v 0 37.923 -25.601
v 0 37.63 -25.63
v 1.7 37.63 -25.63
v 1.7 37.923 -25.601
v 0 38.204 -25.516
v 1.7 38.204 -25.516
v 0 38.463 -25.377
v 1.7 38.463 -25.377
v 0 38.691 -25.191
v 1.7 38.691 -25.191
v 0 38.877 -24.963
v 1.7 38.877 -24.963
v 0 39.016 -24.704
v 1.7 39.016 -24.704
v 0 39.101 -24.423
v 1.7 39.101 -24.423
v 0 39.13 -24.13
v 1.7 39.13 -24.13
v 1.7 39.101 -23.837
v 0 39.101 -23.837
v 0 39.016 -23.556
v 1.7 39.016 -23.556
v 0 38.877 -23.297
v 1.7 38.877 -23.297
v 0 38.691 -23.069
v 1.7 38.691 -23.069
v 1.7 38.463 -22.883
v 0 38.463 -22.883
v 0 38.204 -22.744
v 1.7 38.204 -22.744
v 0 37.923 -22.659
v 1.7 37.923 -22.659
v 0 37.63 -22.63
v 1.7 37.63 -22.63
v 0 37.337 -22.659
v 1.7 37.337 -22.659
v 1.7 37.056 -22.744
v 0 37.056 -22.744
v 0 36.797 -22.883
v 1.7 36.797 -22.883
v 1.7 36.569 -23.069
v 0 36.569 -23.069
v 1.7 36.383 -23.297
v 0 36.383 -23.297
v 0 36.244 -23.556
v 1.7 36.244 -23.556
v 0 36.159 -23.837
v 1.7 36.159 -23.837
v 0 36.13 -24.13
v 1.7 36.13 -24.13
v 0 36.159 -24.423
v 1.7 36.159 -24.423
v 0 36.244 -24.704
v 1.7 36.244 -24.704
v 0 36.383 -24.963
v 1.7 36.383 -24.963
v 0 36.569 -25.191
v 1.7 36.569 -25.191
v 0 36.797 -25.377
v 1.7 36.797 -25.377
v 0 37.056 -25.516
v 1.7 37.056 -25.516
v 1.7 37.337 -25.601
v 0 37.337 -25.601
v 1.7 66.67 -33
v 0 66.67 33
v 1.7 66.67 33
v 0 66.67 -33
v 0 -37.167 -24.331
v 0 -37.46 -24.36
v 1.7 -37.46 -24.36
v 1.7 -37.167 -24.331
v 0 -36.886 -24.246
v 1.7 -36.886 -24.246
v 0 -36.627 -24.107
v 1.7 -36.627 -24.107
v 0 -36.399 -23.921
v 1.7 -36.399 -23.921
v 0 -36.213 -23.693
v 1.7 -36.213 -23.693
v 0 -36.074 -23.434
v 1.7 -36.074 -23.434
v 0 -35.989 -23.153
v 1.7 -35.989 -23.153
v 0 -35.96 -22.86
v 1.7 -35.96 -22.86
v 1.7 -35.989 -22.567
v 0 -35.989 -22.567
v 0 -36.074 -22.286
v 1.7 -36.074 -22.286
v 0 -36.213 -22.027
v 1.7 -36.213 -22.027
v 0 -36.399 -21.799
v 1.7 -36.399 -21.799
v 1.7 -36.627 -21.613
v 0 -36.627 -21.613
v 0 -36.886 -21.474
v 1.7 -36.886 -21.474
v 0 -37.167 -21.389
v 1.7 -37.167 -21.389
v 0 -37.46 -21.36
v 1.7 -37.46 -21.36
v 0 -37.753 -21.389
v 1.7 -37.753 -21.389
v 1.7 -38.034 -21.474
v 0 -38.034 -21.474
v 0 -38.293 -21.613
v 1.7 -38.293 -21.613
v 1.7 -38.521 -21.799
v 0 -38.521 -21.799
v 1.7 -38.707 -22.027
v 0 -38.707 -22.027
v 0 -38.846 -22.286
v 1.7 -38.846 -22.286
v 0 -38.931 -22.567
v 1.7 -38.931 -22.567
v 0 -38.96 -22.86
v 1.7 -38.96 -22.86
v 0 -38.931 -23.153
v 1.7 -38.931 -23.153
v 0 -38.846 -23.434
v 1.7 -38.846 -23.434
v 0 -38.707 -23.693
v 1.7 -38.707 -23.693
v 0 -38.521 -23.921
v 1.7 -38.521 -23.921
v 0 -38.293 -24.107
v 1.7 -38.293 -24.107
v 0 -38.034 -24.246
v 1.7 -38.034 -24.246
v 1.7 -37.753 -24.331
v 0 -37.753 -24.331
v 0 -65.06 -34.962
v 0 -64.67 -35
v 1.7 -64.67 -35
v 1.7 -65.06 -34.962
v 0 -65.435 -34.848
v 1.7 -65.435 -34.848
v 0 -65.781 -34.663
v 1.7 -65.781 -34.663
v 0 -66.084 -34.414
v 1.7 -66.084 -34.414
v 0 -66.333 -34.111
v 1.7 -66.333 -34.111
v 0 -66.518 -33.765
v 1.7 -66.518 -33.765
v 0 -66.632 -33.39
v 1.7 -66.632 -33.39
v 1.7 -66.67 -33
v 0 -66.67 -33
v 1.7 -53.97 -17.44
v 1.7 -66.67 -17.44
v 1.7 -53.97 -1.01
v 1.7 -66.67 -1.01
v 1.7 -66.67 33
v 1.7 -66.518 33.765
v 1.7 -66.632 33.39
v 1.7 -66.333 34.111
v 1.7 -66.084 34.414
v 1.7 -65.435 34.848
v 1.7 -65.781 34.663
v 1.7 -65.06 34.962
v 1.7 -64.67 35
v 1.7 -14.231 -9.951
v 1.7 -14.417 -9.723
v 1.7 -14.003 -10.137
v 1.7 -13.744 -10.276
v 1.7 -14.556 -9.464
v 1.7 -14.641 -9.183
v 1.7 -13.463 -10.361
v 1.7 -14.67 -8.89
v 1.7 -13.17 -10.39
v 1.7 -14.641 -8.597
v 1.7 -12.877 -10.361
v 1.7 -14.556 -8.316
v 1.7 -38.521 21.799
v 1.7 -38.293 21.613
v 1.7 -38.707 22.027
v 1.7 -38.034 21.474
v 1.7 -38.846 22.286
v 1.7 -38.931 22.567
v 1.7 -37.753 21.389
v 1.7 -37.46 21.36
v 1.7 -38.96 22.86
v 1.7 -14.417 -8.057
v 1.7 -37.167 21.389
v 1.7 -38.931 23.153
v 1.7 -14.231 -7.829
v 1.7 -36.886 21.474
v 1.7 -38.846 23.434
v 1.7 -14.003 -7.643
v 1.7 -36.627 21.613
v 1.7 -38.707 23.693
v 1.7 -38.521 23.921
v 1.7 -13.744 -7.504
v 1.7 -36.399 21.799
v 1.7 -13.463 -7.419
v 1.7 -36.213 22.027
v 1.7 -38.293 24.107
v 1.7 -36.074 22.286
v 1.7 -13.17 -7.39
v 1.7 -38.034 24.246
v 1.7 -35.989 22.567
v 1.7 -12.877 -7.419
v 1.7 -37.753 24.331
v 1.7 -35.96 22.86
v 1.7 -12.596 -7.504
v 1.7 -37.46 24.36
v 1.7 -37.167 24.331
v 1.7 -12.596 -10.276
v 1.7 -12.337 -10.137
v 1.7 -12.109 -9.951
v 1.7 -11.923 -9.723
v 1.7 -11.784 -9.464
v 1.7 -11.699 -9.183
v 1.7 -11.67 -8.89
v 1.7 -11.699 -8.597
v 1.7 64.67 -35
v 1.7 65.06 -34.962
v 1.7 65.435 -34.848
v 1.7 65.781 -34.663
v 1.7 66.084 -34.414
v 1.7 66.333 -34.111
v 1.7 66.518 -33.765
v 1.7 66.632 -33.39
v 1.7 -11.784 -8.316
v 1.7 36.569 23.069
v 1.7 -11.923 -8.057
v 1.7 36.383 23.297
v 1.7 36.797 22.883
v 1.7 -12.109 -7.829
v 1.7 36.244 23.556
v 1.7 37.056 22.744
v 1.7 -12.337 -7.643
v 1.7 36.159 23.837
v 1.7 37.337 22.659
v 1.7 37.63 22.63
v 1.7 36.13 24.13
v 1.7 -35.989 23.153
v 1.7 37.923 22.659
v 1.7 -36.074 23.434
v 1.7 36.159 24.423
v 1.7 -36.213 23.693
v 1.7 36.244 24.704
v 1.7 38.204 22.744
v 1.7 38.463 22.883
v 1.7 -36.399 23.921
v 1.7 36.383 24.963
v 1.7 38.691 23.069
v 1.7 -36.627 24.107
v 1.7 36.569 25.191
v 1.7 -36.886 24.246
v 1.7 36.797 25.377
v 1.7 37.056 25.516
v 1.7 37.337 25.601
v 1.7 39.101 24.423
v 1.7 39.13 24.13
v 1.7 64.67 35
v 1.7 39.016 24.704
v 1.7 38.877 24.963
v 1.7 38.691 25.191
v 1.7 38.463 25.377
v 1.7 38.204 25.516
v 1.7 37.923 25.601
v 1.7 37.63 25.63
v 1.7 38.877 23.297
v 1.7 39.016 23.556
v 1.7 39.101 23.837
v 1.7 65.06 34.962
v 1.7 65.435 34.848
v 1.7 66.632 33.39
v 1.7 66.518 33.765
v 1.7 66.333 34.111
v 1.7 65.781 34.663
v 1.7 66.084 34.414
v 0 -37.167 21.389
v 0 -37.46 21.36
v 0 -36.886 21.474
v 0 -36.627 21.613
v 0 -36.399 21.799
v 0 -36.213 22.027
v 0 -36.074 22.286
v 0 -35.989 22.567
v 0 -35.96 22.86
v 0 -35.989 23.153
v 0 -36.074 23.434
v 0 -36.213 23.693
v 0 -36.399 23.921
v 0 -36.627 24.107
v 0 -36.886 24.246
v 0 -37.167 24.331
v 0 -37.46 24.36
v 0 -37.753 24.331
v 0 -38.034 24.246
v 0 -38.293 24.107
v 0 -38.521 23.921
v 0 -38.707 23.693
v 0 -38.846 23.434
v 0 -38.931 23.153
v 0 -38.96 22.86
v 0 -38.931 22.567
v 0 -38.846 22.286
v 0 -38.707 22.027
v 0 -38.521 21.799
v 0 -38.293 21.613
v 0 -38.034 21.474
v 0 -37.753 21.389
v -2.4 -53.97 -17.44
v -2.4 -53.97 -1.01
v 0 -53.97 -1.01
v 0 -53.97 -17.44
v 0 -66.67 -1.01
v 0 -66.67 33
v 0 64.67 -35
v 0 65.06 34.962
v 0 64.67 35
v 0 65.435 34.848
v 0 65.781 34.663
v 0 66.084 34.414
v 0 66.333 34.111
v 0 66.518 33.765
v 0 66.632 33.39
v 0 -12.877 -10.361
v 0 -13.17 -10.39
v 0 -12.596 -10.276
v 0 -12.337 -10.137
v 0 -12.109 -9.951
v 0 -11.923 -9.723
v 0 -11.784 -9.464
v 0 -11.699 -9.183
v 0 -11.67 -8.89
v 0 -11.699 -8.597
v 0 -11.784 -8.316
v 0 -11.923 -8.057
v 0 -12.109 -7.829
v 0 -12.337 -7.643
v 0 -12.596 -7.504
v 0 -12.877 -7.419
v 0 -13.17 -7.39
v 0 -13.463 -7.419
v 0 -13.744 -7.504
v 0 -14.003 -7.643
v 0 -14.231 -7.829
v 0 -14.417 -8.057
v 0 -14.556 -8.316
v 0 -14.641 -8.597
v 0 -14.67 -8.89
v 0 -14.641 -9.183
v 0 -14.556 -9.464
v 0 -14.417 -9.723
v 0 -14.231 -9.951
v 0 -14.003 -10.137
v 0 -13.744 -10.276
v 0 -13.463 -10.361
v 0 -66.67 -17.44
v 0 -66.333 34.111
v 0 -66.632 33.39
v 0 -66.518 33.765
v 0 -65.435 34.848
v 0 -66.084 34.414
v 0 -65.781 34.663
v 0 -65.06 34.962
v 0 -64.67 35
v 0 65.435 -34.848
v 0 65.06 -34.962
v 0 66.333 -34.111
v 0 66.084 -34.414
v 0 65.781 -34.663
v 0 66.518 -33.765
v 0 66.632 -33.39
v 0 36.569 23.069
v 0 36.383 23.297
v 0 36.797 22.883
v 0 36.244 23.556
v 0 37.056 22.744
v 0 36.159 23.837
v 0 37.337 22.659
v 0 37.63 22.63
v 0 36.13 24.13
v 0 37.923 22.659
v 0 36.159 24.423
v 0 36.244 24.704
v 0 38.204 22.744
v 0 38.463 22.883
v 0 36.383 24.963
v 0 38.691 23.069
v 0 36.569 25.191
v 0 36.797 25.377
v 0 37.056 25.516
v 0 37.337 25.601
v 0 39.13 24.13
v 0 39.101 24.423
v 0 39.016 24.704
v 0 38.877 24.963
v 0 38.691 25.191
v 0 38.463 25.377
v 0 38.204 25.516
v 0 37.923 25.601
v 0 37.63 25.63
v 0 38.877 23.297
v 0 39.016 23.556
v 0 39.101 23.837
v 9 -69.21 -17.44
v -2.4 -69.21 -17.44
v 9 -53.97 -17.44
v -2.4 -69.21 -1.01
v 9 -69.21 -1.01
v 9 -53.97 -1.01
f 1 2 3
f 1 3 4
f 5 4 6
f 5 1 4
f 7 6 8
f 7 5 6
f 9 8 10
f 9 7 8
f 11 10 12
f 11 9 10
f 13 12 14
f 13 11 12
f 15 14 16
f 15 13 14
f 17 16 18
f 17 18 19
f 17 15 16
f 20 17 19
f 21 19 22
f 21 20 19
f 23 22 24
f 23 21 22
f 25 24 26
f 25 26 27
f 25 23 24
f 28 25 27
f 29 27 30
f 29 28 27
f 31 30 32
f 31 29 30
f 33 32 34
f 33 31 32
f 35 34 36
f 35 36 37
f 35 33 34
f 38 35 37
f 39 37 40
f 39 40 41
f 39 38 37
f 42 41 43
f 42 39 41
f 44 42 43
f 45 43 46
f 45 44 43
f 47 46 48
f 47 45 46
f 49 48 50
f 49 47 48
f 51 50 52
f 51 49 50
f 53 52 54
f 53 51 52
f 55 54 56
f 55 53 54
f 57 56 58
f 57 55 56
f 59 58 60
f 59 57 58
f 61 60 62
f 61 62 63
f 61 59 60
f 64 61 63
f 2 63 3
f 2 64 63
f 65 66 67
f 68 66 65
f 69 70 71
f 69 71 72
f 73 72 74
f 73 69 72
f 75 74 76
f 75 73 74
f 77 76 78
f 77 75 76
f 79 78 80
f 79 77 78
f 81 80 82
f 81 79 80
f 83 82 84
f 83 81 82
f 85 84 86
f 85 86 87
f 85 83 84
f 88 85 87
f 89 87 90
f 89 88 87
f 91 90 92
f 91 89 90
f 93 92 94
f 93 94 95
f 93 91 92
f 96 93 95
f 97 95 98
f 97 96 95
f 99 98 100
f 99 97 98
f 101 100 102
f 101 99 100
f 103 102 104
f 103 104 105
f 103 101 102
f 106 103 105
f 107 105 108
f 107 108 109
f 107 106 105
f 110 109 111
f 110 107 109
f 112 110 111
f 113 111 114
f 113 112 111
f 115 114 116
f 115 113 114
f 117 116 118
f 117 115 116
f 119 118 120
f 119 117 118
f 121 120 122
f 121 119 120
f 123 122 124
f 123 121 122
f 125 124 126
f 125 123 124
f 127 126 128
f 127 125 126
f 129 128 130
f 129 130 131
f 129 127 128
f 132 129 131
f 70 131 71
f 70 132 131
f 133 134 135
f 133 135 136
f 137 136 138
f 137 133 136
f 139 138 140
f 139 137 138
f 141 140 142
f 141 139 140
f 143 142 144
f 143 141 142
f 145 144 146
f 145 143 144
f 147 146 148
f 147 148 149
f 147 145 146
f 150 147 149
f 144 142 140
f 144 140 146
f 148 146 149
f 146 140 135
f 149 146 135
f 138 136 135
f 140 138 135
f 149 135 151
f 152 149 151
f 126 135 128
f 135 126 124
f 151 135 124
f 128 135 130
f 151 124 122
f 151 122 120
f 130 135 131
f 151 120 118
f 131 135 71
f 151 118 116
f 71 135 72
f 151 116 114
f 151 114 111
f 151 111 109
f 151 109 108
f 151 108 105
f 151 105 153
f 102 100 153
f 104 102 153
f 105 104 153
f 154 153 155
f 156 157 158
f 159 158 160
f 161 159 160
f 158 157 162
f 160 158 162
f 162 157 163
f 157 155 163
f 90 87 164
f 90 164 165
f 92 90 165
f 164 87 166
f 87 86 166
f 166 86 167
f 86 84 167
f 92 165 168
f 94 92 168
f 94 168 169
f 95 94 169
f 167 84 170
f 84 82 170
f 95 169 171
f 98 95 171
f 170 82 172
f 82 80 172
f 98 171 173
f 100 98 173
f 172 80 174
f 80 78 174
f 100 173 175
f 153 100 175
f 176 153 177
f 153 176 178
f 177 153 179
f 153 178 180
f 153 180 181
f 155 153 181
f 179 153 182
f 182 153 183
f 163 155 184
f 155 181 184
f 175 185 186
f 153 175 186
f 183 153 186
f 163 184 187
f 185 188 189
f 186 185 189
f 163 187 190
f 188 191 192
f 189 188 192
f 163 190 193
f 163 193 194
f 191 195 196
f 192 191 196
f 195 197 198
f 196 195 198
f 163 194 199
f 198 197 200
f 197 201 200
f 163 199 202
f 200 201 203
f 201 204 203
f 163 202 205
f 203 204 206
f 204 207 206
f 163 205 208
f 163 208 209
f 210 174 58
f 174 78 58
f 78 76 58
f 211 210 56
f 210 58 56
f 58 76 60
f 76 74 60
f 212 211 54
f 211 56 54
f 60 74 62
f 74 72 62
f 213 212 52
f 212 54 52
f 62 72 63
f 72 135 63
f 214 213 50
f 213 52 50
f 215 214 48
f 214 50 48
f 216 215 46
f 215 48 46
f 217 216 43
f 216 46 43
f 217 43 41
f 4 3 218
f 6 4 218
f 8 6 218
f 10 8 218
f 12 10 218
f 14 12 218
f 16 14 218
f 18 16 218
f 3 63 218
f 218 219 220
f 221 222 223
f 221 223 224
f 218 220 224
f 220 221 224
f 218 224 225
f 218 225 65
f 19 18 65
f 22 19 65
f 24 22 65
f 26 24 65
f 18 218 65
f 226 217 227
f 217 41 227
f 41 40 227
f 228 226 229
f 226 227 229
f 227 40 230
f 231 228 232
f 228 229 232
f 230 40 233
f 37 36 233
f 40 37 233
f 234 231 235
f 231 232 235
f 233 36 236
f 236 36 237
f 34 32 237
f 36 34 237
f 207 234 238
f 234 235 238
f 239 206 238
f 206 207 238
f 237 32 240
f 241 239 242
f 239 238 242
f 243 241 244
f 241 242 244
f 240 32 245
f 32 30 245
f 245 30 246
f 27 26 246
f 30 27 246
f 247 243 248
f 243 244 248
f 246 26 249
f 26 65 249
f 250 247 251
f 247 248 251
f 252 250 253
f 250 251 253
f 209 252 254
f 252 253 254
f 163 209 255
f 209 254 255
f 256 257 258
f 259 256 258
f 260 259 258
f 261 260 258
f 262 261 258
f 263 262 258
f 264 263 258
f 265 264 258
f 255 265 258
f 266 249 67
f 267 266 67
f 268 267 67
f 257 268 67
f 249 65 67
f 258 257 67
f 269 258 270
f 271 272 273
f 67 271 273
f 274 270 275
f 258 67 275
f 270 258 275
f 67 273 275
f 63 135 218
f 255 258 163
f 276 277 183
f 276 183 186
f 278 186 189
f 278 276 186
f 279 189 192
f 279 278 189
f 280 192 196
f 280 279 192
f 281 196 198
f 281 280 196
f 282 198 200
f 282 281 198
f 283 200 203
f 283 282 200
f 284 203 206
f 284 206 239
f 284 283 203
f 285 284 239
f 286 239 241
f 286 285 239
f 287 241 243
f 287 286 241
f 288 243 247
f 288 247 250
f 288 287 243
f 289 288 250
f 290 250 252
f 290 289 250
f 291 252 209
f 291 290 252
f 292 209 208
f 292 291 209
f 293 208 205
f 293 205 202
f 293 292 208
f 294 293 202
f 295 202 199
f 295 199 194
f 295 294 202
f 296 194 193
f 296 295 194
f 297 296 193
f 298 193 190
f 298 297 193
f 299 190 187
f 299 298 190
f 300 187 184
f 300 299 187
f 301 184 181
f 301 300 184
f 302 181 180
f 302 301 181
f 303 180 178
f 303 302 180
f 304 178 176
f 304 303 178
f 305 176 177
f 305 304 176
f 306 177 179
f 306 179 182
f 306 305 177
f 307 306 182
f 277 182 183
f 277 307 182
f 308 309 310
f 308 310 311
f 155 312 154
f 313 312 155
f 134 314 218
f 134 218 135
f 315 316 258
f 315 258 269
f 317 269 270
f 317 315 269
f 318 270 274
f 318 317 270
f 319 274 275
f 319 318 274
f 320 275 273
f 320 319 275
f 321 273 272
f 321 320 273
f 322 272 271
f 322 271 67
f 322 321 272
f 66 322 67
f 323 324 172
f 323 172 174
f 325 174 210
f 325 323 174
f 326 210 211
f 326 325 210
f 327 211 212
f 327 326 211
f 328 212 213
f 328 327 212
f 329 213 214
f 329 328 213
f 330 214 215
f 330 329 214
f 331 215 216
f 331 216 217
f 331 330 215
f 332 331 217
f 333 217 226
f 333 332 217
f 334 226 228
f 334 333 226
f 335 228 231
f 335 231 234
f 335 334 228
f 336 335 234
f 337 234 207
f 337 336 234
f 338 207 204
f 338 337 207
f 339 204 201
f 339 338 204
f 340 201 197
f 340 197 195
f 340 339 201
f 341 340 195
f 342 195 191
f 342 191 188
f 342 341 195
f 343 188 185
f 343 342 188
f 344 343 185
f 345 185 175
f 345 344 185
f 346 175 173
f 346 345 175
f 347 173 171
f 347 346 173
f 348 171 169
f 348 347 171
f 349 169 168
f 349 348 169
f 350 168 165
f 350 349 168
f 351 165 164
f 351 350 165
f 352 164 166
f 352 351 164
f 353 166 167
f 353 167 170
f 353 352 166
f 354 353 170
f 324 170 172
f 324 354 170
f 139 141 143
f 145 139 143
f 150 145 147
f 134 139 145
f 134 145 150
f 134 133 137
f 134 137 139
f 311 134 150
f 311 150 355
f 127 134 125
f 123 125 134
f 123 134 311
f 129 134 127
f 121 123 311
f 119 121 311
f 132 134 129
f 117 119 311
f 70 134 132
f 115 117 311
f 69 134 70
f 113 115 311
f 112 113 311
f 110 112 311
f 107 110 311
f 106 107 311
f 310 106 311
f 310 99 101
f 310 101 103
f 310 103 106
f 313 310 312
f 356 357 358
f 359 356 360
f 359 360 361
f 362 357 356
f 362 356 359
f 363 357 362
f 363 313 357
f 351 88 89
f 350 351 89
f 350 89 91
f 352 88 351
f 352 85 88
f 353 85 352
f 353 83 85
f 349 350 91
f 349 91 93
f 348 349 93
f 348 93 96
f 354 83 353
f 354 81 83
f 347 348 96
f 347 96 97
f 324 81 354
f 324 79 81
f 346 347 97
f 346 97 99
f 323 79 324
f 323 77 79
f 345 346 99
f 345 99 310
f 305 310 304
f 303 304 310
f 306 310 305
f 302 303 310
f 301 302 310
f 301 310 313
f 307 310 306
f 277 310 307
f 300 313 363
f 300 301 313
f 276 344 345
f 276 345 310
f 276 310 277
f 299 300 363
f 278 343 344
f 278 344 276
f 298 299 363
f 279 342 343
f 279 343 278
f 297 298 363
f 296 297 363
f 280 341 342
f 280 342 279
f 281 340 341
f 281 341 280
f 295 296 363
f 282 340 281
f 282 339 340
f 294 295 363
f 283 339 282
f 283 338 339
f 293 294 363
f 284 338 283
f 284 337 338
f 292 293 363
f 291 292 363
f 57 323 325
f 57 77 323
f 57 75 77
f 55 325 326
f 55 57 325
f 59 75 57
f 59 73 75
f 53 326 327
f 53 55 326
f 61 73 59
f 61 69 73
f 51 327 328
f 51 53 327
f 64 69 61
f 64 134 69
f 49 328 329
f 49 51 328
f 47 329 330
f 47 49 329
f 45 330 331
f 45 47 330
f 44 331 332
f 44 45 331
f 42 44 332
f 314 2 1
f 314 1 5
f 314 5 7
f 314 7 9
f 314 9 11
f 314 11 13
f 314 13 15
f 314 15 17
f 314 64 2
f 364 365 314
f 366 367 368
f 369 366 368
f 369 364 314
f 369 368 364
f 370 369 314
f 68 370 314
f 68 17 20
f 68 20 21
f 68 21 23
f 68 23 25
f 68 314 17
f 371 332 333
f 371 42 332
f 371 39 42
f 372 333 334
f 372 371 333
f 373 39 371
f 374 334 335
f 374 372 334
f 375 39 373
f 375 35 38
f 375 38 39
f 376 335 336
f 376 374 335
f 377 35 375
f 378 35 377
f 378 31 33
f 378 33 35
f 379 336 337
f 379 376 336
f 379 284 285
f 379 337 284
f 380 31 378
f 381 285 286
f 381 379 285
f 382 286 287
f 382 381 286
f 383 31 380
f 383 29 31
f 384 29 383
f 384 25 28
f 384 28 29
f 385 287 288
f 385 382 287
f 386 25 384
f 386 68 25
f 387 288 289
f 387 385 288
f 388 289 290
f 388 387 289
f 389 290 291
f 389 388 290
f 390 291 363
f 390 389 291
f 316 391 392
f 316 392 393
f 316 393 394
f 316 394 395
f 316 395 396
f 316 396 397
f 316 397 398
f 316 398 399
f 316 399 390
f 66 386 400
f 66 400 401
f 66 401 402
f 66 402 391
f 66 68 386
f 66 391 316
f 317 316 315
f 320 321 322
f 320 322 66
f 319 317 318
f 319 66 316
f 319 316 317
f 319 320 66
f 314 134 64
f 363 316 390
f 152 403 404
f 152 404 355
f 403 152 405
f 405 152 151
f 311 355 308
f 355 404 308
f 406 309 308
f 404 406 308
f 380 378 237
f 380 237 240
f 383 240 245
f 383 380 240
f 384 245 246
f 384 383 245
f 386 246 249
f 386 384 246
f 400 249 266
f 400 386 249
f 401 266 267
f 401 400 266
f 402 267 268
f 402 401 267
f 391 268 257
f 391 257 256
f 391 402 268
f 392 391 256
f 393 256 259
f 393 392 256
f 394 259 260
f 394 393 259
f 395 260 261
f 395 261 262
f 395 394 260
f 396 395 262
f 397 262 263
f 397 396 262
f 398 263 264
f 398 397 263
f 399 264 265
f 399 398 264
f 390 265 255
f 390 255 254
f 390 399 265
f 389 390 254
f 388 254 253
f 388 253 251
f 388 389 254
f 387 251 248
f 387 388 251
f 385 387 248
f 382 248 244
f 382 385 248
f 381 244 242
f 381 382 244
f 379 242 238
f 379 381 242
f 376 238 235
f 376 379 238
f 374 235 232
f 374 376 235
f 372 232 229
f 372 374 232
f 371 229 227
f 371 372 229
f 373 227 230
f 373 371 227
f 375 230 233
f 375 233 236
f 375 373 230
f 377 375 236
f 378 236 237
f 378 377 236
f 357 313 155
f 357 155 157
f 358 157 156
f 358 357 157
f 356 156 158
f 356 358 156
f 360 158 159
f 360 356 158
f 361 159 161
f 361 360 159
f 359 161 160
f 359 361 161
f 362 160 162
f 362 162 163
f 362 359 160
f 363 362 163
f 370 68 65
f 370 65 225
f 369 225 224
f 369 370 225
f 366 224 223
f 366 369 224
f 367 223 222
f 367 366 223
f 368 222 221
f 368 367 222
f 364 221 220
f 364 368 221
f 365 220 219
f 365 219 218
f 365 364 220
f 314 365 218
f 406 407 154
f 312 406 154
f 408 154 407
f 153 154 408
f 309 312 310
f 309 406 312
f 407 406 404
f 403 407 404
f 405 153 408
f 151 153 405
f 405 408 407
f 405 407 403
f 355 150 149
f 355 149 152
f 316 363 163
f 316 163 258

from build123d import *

# Parameters (mm, degrees)
SKETCH1_R                = 1.5
BOSS_EXTRUDE2_DEPTH      = 1.7
BOSS_EXTRUDE3_DEPTH      = 7.3
BOSS_EXTRUDE3_DEPTH_BACK = 4.1
SKETCH2_W                = 16.43
SKETCH2_H                = 15.24


with BuildPart() as part:
    # Sketch1 → Boss-Extrude2 (new body)
    with BuildSketch(Plane(origin=(0, 0, 0), x_dir=(0, 0, -1), z_dir=(1, 0, 0))):
        with BuildLine():
            Line((-33, 66.67), (33, 66.67))
            ThreePointArc((33, 66.67), (34.414213562, 66.084213562), (35, 64.67))
            Line((35, 64.67), (35, -64.67))
            ThreePointArc((35, -64.67), (34.414213562, -66.084213562), (33, -66.67))
            Line((33, -66.67), (-33, -66.67))
            ThreePointArc((-33, -66.67), (-34.414213562, -66.084213562), (-35, -64.67))
            Line((-35, -64.67), (-35, 64.67))
            ThreePointArc((-35, 64.67), (-34.414213562, 66.084213562), (-33, 66.67))
        make_face()
        with Locations((-22.86, -37.46)):
            Circle(SKETCH1_R, mode=Mode.SUBTRACT)
        with Locations((22.86, -37.46)):
            Circle(SKETCH1_R, mode=Mode.SUBTRACT)
        with Locations((-24.13, 37.63)):
            Circle(SKETCH1_R, mode=Mode.SUBTRACT)
        with Locations((24.13, 37.63)):
            Circle(SKETCH1_R, mode=Mode.SUBTRACT)
        with Locations((8.89, -13.17)):
            Circle(SKETCH1_R, mode=Mode.SUBTRACT)
    extrude(amount=BOSS_EXTRUDE2_DEPTH)

    # Sketch2 → Boss-Extrude3 (add, two sides: drawn at the far end of the back side and taken through both)
    with BuildSketch(Plane(origin=(1.7, 0, 0), x_dir=(0, 0, -1), z_dir=(1, 0, 0)).offset(-BOSS_EXTRUDE3_DEPTH_BACK)):
        with Locations((9.225, -61.59)):
            Rectangle(SKETCH2_W, SKETCH2_H)
    extrude(amount=BOSS_EXTRUDE3_DEPTH + BOSS_EXTRUDE3_DEPTH_BACK)


solid = part.part
